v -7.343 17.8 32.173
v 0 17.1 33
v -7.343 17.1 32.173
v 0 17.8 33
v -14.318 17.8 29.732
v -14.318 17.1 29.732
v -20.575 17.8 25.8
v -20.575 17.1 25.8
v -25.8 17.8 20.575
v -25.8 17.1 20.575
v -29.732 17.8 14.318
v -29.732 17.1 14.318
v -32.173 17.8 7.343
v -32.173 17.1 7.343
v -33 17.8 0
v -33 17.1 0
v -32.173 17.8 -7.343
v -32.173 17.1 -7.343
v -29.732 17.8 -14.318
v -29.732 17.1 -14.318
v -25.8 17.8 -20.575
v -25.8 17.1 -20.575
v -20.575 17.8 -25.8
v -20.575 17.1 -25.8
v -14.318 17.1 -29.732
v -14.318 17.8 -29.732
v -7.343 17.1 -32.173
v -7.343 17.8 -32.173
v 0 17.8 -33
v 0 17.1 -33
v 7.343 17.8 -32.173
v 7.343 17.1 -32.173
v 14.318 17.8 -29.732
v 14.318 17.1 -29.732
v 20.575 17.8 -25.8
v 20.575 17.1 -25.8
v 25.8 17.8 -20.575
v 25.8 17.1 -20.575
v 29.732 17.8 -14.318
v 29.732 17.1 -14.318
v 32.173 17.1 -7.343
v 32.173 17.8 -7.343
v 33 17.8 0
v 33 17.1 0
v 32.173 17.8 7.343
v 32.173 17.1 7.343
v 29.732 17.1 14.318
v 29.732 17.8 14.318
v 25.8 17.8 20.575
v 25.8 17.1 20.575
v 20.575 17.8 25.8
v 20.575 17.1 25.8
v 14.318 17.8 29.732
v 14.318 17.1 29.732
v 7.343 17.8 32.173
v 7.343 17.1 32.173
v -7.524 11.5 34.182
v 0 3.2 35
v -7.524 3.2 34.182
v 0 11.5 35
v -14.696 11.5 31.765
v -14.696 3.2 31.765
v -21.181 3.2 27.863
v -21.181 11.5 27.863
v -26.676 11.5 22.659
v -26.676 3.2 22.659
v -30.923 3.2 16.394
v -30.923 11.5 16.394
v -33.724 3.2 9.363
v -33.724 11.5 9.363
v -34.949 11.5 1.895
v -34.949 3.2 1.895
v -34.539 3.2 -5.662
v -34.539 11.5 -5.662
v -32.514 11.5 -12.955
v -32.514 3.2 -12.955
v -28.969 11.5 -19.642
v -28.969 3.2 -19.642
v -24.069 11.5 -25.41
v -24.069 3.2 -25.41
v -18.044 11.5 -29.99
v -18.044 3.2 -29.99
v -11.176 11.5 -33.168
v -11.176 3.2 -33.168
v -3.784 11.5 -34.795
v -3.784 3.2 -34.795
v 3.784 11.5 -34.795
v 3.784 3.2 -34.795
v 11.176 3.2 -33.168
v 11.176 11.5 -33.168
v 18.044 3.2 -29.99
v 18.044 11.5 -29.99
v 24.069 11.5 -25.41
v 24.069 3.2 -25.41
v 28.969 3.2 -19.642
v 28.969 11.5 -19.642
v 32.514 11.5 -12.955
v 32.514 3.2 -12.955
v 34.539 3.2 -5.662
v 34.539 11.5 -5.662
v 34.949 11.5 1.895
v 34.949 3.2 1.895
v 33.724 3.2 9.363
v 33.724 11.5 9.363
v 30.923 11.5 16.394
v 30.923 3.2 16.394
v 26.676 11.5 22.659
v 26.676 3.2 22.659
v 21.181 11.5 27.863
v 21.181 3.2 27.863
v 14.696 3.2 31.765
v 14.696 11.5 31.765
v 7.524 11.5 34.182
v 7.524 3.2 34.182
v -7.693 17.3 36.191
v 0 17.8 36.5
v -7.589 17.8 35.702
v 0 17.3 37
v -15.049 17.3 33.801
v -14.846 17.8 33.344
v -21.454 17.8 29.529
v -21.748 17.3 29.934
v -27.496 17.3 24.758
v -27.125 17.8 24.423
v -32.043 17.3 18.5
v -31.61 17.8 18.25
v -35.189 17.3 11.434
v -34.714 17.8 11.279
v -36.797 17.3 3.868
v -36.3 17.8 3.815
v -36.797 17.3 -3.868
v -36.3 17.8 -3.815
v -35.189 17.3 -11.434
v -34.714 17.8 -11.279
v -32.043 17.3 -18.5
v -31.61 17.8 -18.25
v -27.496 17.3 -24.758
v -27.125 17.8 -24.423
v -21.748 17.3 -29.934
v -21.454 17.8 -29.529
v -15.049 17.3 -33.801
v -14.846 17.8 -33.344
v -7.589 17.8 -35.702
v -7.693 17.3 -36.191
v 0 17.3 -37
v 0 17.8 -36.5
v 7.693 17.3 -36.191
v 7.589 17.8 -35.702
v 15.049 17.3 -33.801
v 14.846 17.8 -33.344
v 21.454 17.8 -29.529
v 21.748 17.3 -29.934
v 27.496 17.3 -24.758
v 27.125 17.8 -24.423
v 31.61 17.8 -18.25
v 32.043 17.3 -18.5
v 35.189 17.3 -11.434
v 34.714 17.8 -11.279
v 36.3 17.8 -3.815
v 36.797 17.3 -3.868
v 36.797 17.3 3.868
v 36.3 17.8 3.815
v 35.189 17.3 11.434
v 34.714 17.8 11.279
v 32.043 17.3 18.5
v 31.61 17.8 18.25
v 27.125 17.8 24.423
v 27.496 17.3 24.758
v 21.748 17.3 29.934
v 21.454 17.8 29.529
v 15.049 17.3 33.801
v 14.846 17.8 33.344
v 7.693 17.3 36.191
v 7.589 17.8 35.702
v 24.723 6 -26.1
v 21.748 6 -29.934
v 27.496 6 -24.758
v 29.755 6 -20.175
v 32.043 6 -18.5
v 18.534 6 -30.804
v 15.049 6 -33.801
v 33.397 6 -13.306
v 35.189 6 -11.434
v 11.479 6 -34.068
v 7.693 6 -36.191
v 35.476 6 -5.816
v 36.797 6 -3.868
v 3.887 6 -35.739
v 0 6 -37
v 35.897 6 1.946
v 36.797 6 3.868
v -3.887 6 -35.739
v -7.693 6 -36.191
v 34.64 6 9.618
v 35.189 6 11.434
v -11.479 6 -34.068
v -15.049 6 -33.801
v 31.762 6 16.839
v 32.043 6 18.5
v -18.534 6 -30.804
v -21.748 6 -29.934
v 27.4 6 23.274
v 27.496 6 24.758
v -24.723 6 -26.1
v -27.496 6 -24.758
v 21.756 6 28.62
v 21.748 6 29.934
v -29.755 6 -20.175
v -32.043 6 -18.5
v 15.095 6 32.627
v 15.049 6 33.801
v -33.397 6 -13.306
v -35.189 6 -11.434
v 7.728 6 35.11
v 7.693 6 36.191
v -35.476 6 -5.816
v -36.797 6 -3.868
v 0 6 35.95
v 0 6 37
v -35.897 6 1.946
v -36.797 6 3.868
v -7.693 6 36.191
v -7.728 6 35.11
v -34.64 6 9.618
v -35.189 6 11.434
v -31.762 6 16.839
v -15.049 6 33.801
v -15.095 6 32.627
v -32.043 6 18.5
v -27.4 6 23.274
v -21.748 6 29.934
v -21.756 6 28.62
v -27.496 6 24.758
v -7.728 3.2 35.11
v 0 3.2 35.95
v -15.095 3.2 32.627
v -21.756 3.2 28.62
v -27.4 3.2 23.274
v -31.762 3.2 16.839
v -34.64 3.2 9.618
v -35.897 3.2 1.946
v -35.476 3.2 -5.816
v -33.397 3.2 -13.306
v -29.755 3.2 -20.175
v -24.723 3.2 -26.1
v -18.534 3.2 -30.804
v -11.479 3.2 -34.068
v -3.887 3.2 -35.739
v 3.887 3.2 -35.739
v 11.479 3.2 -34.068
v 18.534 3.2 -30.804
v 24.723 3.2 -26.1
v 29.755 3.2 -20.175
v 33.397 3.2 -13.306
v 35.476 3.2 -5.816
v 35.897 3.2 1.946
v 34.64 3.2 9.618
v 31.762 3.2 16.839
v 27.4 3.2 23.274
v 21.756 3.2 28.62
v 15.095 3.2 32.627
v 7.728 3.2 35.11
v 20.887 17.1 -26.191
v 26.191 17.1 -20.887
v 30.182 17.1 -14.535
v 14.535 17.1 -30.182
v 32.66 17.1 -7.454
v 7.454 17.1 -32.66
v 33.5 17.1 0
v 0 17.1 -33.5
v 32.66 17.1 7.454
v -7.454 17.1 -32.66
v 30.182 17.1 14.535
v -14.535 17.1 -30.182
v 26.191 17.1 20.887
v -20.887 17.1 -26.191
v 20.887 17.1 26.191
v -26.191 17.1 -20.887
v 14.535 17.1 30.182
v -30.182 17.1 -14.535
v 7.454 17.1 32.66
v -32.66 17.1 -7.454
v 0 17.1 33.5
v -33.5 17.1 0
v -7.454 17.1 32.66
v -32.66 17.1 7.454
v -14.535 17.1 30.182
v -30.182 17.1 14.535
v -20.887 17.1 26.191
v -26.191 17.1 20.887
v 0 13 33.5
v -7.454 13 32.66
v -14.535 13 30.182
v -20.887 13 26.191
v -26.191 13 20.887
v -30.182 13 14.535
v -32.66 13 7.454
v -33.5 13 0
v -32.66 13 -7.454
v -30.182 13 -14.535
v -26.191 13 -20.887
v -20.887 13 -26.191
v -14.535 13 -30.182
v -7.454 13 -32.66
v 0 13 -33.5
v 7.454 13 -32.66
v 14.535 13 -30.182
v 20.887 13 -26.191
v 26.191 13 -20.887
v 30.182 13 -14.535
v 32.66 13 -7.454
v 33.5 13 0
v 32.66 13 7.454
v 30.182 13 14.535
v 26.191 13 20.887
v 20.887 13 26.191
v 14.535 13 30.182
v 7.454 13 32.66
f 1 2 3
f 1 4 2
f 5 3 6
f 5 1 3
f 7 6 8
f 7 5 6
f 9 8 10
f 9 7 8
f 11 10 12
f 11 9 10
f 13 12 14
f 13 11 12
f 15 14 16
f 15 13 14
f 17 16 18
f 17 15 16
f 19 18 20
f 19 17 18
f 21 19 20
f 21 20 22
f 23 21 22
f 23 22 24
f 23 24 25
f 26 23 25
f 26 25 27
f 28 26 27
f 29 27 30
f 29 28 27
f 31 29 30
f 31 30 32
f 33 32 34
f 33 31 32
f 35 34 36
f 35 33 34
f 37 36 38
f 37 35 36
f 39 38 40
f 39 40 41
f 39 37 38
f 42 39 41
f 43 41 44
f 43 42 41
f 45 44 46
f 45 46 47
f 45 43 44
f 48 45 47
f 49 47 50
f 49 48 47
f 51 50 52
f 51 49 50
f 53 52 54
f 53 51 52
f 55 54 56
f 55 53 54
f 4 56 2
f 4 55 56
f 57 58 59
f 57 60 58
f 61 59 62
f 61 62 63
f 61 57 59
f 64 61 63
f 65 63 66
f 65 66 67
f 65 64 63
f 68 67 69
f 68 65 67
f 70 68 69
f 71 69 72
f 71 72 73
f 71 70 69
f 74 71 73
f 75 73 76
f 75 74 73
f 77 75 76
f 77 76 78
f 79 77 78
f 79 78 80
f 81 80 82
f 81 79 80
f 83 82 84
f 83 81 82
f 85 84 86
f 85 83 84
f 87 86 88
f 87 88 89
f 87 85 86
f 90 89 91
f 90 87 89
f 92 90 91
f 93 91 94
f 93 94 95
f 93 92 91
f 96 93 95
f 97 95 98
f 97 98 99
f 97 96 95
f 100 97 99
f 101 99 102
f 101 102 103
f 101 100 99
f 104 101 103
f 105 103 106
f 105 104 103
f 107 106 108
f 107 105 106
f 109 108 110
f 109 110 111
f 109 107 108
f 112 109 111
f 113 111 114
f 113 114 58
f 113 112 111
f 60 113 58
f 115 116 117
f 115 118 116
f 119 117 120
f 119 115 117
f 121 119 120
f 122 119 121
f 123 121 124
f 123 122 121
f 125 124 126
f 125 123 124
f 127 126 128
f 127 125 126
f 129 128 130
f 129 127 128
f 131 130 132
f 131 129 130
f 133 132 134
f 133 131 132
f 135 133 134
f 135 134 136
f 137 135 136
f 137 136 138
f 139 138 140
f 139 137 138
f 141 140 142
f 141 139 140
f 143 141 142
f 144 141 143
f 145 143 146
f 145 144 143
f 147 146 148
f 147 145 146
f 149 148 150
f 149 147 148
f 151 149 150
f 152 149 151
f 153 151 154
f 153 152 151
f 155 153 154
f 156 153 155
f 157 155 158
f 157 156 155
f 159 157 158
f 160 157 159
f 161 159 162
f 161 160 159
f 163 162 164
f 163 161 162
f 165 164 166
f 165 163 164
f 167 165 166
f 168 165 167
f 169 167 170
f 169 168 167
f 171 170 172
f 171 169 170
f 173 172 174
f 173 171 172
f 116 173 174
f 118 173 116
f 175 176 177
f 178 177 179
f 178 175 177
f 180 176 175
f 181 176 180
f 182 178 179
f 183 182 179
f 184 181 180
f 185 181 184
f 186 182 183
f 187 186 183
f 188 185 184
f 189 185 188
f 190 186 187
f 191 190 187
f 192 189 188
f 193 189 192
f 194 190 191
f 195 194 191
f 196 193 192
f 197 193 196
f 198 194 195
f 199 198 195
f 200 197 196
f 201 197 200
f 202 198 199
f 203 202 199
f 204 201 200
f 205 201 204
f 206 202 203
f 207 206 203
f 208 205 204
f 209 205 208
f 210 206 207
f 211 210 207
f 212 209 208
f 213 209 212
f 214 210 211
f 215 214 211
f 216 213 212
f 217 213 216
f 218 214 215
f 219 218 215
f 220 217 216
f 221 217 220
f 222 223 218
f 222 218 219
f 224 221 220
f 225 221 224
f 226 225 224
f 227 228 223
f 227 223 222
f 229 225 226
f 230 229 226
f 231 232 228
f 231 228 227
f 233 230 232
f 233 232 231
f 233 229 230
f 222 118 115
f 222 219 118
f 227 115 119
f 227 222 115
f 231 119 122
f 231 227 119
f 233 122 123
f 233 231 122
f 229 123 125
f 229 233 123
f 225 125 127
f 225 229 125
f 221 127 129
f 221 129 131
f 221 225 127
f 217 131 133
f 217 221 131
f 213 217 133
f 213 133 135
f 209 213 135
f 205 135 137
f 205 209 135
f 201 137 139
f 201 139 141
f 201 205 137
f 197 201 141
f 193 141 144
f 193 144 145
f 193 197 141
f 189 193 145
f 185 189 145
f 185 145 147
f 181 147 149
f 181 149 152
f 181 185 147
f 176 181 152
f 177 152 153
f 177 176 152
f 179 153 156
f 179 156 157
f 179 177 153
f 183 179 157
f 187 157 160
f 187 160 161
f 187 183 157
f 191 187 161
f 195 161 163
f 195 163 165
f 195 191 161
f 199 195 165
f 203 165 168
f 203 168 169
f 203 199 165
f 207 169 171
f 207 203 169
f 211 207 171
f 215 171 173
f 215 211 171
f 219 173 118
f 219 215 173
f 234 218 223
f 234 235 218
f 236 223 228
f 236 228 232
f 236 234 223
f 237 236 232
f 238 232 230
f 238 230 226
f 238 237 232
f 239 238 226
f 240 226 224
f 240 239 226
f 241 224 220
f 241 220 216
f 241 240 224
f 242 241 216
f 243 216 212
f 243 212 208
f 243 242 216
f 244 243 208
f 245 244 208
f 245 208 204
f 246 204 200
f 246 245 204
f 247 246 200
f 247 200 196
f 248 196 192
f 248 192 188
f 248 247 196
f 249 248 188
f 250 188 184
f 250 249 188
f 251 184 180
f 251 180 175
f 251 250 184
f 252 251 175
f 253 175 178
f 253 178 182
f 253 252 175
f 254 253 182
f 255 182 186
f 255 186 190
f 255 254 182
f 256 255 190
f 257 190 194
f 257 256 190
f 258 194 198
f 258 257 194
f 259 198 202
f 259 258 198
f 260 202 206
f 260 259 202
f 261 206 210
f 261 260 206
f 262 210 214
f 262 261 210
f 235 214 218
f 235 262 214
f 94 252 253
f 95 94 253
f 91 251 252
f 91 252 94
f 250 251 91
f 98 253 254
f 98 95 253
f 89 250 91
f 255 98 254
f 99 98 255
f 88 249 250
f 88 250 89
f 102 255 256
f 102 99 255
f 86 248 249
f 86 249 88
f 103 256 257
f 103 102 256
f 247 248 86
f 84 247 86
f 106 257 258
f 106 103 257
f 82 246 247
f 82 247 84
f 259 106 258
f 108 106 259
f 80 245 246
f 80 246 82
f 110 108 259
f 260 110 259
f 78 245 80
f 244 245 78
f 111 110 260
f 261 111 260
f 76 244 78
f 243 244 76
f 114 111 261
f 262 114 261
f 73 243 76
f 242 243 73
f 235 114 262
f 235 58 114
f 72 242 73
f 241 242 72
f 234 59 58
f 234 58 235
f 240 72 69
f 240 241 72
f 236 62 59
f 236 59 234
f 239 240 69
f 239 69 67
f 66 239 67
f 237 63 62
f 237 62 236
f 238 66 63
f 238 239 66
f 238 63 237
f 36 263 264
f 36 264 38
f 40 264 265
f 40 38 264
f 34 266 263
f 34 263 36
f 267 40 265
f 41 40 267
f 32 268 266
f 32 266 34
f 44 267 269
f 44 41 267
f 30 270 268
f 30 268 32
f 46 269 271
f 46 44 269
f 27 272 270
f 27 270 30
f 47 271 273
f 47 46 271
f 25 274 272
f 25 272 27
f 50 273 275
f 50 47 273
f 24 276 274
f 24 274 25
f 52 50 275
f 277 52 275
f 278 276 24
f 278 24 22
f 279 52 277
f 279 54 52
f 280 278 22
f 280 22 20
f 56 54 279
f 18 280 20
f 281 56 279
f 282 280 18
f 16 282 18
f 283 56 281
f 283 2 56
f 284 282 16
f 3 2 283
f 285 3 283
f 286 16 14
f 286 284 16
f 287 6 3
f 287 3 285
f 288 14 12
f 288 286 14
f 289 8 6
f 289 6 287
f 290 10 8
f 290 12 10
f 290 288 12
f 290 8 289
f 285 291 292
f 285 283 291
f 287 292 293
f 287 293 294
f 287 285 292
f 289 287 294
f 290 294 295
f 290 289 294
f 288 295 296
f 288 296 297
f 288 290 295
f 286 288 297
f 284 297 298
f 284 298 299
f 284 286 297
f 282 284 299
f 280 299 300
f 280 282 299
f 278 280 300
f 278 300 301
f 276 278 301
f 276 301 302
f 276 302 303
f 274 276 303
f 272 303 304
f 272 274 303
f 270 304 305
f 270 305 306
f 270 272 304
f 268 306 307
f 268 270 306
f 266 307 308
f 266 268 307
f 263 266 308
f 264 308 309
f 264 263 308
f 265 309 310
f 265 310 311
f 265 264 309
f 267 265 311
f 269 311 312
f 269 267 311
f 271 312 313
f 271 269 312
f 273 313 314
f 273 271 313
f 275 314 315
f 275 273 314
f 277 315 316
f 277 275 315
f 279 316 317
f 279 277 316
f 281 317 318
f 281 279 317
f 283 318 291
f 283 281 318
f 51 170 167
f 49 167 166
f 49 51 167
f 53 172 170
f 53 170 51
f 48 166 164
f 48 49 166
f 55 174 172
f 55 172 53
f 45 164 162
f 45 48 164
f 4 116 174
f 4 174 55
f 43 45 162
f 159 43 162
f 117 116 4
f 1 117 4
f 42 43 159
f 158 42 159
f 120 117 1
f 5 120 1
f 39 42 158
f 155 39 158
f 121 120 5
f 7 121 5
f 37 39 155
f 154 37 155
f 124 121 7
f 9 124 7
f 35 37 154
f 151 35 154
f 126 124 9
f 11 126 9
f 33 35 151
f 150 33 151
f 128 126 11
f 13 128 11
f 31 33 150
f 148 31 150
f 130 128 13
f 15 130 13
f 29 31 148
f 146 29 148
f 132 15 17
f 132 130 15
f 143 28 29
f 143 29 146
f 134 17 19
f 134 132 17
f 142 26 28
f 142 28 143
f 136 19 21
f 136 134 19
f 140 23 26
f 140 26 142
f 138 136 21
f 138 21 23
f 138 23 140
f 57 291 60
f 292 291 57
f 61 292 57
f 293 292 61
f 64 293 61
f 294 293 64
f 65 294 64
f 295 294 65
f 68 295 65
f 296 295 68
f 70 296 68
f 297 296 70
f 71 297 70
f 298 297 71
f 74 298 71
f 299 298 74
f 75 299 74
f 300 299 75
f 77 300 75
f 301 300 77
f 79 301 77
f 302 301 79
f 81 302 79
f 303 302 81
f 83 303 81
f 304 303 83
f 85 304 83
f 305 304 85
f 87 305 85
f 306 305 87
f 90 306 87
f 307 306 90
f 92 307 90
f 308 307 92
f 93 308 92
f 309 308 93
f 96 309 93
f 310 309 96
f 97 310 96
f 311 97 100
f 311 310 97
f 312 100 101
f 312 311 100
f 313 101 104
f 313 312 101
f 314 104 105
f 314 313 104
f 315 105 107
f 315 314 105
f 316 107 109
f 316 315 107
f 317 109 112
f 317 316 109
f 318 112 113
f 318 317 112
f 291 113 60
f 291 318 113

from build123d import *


with BuildPart() as part:
    # Sketch1 → Revolve1 (revolve)
    with BuildSketch(Plane.XY):
        Polygon((-35, 3.2), (-35, 11.5), (-33.5, 13), (-33.5, 17.1), (-33, 17.1), (-33, 17.8), (-36.5, 17.8), (-37, 17.3), (-37, 6), (-35.95, 6), (-35.95, 3.2), align=None)
    revolve(axis=Axis((0, 0, 0), (0, -1, 0)))


solid = part.part
